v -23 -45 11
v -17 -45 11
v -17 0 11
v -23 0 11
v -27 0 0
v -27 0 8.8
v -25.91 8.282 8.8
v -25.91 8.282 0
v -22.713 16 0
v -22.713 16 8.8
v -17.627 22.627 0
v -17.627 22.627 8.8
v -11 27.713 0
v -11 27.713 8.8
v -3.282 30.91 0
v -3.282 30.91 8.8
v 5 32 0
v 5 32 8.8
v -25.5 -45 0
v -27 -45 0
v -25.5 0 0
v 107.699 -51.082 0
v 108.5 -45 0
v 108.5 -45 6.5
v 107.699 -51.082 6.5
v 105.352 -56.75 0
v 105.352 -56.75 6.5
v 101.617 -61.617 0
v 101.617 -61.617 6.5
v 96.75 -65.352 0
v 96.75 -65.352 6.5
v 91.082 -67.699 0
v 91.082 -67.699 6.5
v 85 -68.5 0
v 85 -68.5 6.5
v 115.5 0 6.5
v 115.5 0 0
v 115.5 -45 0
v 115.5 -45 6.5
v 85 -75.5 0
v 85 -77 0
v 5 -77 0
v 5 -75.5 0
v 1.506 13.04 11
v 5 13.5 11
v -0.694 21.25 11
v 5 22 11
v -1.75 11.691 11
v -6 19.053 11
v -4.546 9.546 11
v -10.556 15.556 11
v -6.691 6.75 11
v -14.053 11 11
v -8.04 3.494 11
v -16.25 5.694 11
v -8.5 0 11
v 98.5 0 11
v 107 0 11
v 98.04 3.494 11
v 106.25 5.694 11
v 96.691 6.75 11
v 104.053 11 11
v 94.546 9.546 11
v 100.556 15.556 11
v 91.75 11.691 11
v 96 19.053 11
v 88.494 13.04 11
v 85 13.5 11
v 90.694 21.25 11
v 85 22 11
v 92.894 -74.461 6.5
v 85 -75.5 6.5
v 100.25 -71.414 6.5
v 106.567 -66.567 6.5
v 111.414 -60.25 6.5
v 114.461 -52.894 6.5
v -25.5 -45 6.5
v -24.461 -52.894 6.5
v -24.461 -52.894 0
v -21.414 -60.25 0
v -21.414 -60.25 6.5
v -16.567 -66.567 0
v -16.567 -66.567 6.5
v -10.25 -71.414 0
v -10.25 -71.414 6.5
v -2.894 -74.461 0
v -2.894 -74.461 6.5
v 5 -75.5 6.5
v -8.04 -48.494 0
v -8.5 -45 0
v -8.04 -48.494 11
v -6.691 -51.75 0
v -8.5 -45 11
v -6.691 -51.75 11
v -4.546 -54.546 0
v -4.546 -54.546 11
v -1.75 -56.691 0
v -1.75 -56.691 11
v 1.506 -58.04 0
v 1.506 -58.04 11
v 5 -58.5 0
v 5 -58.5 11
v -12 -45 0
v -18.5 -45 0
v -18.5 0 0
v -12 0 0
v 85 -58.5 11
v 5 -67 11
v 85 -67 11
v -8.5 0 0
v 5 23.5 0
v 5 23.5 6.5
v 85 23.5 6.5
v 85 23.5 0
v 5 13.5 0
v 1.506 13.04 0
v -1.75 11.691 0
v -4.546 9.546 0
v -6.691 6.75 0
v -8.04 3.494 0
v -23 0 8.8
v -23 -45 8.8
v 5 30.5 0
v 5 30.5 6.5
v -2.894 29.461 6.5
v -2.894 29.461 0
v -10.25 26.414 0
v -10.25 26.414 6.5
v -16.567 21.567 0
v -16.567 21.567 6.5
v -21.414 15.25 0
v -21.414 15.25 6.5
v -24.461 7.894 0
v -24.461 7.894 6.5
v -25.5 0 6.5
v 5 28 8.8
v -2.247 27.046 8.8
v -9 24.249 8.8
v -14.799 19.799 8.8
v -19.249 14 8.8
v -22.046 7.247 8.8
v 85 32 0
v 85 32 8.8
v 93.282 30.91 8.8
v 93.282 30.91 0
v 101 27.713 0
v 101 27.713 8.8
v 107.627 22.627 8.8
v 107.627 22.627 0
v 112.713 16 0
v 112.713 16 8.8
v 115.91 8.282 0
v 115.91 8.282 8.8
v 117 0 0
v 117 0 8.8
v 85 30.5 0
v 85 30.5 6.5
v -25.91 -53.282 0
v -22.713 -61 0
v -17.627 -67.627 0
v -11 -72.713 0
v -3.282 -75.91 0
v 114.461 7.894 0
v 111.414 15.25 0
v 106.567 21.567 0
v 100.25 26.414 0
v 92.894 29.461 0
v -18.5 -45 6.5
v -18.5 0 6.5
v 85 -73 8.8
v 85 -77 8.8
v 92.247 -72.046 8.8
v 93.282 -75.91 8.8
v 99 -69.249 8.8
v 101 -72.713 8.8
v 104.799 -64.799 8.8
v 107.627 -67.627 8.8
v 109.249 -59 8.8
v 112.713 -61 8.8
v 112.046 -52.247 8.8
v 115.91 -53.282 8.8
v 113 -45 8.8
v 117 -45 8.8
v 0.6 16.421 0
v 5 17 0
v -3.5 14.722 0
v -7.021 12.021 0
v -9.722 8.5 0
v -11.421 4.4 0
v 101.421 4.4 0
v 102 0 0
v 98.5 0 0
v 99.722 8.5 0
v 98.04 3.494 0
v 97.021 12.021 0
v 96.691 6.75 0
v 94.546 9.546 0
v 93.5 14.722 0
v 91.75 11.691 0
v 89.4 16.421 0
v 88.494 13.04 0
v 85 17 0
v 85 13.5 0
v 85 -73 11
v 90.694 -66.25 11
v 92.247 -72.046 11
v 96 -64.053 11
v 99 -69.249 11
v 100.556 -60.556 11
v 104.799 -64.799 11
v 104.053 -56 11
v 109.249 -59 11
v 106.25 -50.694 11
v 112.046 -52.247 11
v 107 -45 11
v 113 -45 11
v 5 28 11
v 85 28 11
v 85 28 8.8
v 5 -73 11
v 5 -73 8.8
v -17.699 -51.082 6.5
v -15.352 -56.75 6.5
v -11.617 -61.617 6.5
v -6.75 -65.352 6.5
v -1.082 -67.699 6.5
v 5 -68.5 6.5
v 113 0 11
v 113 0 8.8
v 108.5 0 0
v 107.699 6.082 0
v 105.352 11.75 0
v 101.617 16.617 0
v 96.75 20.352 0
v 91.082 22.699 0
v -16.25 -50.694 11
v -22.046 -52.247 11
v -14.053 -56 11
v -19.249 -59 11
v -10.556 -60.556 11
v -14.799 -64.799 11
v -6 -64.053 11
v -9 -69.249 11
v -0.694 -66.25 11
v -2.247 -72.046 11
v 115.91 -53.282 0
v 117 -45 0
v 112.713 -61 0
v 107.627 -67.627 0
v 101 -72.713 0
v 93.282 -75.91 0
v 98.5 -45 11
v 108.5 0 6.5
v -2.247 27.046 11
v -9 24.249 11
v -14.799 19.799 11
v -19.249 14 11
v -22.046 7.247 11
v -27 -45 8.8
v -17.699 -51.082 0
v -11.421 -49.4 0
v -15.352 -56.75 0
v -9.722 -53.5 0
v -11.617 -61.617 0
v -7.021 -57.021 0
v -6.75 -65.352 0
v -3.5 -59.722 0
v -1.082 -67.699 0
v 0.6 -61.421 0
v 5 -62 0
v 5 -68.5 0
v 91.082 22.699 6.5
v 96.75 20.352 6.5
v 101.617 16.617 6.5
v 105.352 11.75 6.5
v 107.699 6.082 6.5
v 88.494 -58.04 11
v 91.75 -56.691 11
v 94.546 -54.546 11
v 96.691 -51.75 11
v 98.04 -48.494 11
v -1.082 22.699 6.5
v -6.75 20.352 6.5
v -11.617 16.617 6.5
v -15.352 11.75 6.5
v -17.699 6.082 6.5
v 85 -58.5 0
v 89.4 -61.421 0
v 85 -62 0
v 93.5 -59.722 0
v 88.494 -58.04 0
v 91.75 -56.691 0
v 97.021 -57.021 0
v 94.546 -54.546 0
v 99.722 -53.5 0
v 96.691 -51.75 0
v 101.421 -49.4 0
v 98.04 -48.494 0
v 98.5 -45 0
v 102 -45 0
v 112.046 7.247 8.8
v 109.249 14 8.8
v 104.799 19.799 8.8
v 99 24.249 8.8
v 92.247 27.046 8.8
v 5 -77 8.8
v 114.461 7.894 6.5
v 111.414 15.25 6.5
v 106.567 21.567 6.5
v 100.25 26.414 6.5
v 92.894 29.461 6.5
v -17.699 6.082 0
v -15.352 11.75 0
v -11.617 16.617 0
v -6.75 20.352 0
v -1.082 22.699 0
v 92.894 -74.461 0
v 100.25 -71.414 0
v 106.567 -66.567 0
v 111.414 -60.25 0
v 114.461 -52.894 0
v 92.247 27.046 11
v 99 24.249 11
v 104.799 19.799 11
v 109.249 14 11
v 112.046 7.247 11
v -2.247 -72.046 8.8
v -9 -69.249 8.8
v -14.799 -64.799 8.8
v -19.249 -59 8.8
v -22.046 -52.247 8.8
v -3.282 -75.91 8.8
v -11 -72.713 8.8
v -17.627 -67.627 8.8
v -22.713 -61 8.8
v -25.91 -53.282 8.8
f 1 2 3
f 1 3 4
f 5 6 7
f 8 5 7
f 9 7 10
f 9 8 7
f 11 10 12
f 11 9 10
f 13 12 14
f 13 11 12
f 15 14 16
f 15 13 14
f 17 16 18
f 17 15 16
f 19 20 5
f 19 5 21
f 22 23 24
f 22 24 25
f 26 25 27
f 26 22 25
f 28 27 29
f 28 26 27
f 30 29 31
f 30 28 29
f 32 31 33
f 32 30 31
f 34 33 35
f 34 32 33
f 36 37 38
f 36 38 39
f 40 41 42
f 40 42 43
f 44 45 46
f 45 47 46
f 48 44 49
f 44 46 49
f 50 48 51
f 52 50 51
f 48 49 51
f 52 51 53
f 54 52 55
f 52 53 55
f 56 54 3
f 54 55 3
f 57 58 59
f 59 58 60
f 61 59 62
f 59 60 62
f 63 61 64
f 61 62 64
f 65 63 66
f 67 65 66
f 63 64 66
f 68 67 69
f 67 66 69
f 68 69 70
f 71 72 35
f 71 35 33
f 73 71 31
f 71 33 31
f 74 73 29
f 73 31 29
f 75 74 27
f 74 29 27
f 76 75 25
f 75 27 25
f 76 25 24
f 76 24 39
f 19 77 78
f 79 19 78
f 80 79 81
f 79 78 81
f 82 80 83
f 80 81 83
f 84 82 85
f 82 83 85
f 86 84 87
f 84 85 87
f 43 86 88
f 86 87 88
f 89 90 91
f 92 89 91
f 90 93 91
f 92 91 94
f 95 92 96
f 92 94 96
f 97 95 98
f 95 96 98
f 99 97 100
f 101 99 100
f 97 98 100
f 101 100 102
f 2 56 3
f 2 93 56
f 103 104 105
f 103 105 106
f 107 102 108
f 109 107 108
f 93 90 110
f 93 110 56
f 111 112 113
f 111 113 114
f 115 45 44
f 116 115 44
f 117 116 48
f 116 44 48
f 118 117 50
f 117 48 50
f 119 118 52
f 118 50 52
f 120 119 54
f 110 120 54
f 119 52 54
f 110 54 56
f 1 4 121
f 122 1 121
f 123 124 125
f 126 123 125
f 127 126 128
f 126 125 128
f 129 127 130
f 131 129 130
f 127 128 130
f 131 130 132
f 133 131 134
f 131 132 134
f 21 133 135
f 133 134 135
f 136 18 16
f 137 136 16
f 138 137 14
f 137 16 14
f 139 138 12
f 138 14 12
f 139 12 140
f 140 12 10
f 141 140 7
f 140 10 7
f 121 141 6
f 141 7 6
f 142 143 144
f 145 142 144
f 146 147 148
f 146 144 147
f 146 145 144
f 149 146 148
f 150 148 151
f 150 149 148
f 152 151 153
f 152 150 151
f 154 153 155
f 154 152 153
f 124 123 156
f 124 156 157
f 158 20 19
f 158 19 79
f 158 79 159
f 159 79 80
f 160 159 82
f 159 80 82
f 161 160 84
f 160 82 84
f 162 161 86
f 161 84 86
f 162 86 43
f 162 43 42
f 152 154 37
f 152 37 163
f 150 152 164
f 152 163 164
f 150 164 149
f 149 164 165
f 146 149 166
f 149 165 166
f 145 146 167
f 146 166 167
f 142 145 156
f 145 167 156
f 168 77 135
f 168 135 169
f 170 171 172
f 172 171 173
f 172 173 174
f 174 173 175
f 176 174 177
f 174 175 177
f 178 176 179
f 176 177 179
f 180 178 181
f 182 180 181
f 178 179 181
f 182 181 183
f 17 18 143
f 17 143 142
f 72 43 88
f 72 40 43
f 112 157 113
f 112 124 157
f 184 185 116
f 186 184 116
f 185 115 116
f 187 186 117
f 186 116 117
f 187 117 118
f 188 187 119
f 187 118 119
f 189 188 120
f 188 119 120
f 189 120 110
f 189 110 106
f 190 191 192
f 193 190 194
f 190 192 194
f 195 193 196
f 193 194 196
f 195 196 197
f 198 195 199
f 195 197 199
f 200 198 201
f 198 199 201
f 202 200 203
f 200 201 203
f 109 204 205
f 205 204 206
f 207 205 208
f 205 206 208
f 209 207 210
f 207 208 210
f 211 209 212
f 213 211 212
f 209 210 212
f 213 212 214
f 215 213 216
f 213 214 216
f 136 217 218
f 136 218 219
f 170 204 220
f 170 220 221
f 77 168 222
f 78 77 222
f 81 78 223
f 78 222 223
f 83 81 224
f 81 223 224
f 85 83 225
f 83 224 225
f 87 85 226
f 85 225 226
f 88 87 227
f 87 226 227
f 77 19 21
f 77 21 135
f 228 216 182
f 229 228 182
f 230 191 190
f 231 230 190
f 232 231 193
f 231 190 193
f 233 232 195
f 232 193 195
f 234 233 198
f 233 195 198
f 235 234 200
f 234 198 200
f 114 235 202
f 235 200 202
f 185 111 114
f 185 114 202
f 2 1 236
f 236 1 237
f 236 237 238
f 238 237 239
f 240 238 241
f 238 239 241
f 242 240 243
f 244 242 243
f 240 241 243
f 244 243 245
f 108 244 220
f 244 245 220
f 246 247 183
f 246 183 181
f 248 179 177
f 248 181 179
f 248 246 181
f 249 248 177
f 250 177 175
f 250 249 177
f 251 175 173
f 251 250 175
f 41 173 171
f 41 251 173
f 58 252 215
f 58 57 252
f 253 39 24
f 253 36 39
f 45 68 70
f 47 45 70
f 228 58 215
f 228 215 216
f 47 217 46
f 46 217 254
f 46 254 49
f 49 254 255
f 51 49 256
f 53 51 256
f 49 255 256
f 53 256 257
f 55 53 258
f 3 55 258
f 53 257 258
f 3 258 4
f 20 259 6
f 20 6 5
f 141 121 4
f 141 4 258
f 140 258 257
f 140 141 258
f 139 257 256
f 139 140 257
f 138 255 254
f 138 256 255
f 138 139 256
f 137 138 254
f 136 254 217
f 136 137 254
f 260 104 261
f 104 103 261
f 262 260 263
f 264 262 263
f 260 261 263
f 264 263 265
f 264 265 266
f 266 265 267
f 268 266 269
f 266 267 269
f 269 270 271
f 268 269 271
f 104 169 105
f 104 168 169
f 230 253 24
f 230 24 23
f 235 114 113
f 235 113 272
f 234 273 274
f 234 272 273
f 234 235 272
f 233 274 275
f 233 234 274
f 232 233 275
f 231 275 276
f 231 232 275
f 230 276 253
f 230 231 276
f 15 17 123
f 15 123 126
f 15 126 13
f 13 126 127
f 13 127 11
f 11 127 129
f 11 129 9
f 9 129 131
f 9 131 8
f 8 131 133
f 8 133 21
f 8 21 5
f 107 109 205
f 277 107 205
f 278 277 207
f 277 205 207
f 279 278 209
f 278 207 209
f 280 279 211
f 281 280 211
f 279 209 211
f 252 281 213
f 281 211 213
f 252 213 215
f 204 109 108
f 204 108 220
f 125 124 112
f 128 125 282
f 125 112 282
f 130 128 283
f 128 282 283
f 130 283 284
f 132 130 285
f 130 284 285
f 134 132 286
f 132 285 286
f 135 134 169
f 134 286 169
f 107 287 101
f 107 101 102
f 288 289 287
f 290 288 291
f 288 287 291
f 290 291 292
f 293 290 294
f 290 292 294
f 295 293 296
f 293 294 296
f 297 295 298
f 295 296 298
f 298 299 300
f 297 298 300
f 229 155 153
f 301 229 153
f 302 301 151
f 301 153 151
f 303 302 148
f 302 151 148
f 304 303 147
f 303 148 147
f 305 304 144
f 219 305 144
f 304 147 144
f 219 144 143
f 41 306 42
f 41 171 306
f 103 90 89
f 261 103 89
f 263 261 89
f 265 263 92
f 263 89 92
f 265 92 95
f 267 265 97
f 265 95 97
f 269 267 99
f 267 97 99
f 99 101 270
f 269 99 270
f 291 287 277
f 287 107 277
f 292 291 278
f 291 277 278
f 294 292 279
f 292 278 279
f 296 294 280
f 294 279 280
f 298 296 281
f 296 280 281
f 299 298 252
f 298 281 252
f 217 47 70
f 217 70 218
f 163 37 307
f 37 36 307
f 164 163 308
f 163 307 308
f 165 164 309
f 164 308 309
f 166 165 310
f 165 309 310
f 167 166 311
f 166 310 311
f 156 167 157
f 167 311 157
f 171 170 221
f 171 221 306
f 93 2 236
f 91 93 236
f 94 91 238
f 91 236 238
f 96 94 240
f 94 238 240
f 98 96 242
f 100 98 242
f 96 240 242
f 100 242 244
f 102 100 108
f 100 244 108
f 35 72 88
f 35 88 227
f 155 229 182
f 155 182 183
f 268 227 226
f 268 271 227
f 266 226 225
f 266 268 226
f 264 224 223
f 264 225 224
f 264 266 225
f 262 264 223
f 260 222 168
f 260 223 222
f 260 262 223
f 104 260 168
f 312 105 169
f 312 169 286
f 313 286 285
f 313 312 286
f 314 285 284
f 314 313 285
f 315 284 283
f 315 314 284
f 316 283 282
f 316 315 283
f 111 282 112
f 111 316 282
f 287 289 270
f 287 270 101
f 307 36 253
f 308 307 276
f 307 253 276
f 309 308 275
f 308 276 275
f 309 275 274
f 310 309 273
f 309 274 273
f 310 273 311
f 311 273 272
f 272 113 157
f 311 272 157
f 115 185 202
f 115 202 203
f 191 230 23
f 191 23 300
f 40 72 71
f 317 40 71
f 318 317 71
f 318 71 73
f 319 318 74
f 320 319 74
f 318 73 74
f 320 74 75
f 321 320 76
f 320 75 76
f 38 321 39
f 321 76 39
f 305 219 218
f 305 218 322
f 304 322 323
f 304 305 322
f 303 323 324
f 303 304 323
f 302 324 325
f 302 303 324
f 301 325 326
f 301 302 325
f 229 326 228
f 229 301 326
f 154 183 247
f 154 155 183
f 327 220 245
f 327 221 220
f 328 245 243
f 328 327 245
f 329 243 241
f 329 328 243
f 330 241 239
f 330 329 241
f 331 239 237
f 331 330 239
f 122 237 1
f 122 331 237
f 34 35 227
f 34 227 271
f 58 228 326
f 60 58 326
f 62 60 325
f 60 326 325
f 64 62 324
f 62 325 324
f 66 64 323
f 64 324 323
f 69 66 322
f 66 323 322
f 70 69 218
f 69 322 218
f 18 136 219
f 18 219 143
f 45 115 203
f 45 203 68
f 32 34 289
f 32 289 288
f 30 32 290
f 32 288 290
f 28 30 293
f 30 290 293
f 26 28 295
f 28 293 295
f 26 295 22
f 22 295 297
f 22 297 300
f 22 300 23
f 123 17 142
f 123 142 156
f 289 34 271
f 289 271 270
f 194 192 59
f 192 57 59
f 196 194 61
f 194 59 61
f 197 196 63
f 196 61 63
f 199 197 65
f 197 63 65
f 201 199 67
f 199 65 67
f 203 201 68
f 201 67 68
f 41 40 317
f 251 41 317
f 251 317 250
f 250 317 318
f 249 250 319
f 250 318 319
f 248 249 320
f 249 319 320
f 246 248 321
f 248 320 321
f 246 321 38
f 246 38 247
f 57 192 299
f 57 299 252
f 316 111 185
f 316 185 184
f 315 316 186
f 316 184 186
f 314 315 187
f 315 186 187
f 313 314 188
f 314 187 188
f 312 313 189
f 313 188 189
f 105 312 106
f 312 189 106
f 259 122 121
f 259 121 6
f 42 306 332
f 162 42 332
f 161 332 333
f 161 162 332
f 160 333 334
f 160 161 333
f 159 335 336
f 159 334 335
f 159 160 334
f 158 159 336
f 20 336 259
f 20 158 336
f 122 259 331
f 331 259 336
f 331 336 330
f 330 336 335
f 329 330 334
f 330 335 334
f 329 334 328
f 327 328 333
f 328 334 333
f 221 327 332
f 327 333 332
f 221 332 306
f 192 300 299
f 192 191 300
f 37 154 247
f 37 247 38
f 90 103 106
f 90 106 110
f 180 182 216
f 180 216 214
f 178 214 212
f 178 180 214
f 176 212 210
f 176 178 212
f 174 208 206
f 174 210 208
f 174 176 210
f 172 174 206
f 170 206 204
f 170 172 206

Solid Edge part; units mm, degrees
sketch "Sketch1" plane through (0, 0, 0) normal (0, 0, 1) x (1, 0, 0)
  line L0 (85, 5) -> (5, 5)
  arc A0 (0, 0) -> (5, 5) centre (5, 0) cw
  line L1 (0, 0) -> (0, -45)
  arc A1 (0, -45) -> (5, -50) centre (5, -45) ccw
  line L2 (5, -50) -> (85, -50)
  arc A2 (90, -45) -> (85, -50) centre (85, -45) cw
  line L3 (90, -45) -> (90, 0)
  arc A3 (85, 5) -> (90, 0) centre (85, 0) cw
sketch "Sketch2" plane through (0, 0, 0) normal (0, -1, 0) x (1, 0, 0)
  line L0 (-12, 0) -> (-8.5, 0)
  line L1 (-8.5, 11) -> (-8.5, 0)
  line L2 (-8.5, 11) -> (-17, 11)
  line L3 (-23, 11) -> (-17, 11)
  line L4 (-23, 11) -> (-23, 8.8)
  line L5 (-23, 8.8) -> (-27, 8.8)
  line L6 (-27, 8.8) -> (-27, 0)
  line L7 (-27, 0) -> (-25.5, 0)
  line L8 (-25.5, 0) -> (-25.5, 6.5)
  line L9 (-25.5, 6.5) -> (-18.5, 6.5)
  line L10 (-18.5, 6.5) -> (-18.5, 0)
  line L11 (-12, 0) -> (-18.5, 0)
sweep "SweptProtrusion_13" add profiles "Sketch2" path "Sketch1"
